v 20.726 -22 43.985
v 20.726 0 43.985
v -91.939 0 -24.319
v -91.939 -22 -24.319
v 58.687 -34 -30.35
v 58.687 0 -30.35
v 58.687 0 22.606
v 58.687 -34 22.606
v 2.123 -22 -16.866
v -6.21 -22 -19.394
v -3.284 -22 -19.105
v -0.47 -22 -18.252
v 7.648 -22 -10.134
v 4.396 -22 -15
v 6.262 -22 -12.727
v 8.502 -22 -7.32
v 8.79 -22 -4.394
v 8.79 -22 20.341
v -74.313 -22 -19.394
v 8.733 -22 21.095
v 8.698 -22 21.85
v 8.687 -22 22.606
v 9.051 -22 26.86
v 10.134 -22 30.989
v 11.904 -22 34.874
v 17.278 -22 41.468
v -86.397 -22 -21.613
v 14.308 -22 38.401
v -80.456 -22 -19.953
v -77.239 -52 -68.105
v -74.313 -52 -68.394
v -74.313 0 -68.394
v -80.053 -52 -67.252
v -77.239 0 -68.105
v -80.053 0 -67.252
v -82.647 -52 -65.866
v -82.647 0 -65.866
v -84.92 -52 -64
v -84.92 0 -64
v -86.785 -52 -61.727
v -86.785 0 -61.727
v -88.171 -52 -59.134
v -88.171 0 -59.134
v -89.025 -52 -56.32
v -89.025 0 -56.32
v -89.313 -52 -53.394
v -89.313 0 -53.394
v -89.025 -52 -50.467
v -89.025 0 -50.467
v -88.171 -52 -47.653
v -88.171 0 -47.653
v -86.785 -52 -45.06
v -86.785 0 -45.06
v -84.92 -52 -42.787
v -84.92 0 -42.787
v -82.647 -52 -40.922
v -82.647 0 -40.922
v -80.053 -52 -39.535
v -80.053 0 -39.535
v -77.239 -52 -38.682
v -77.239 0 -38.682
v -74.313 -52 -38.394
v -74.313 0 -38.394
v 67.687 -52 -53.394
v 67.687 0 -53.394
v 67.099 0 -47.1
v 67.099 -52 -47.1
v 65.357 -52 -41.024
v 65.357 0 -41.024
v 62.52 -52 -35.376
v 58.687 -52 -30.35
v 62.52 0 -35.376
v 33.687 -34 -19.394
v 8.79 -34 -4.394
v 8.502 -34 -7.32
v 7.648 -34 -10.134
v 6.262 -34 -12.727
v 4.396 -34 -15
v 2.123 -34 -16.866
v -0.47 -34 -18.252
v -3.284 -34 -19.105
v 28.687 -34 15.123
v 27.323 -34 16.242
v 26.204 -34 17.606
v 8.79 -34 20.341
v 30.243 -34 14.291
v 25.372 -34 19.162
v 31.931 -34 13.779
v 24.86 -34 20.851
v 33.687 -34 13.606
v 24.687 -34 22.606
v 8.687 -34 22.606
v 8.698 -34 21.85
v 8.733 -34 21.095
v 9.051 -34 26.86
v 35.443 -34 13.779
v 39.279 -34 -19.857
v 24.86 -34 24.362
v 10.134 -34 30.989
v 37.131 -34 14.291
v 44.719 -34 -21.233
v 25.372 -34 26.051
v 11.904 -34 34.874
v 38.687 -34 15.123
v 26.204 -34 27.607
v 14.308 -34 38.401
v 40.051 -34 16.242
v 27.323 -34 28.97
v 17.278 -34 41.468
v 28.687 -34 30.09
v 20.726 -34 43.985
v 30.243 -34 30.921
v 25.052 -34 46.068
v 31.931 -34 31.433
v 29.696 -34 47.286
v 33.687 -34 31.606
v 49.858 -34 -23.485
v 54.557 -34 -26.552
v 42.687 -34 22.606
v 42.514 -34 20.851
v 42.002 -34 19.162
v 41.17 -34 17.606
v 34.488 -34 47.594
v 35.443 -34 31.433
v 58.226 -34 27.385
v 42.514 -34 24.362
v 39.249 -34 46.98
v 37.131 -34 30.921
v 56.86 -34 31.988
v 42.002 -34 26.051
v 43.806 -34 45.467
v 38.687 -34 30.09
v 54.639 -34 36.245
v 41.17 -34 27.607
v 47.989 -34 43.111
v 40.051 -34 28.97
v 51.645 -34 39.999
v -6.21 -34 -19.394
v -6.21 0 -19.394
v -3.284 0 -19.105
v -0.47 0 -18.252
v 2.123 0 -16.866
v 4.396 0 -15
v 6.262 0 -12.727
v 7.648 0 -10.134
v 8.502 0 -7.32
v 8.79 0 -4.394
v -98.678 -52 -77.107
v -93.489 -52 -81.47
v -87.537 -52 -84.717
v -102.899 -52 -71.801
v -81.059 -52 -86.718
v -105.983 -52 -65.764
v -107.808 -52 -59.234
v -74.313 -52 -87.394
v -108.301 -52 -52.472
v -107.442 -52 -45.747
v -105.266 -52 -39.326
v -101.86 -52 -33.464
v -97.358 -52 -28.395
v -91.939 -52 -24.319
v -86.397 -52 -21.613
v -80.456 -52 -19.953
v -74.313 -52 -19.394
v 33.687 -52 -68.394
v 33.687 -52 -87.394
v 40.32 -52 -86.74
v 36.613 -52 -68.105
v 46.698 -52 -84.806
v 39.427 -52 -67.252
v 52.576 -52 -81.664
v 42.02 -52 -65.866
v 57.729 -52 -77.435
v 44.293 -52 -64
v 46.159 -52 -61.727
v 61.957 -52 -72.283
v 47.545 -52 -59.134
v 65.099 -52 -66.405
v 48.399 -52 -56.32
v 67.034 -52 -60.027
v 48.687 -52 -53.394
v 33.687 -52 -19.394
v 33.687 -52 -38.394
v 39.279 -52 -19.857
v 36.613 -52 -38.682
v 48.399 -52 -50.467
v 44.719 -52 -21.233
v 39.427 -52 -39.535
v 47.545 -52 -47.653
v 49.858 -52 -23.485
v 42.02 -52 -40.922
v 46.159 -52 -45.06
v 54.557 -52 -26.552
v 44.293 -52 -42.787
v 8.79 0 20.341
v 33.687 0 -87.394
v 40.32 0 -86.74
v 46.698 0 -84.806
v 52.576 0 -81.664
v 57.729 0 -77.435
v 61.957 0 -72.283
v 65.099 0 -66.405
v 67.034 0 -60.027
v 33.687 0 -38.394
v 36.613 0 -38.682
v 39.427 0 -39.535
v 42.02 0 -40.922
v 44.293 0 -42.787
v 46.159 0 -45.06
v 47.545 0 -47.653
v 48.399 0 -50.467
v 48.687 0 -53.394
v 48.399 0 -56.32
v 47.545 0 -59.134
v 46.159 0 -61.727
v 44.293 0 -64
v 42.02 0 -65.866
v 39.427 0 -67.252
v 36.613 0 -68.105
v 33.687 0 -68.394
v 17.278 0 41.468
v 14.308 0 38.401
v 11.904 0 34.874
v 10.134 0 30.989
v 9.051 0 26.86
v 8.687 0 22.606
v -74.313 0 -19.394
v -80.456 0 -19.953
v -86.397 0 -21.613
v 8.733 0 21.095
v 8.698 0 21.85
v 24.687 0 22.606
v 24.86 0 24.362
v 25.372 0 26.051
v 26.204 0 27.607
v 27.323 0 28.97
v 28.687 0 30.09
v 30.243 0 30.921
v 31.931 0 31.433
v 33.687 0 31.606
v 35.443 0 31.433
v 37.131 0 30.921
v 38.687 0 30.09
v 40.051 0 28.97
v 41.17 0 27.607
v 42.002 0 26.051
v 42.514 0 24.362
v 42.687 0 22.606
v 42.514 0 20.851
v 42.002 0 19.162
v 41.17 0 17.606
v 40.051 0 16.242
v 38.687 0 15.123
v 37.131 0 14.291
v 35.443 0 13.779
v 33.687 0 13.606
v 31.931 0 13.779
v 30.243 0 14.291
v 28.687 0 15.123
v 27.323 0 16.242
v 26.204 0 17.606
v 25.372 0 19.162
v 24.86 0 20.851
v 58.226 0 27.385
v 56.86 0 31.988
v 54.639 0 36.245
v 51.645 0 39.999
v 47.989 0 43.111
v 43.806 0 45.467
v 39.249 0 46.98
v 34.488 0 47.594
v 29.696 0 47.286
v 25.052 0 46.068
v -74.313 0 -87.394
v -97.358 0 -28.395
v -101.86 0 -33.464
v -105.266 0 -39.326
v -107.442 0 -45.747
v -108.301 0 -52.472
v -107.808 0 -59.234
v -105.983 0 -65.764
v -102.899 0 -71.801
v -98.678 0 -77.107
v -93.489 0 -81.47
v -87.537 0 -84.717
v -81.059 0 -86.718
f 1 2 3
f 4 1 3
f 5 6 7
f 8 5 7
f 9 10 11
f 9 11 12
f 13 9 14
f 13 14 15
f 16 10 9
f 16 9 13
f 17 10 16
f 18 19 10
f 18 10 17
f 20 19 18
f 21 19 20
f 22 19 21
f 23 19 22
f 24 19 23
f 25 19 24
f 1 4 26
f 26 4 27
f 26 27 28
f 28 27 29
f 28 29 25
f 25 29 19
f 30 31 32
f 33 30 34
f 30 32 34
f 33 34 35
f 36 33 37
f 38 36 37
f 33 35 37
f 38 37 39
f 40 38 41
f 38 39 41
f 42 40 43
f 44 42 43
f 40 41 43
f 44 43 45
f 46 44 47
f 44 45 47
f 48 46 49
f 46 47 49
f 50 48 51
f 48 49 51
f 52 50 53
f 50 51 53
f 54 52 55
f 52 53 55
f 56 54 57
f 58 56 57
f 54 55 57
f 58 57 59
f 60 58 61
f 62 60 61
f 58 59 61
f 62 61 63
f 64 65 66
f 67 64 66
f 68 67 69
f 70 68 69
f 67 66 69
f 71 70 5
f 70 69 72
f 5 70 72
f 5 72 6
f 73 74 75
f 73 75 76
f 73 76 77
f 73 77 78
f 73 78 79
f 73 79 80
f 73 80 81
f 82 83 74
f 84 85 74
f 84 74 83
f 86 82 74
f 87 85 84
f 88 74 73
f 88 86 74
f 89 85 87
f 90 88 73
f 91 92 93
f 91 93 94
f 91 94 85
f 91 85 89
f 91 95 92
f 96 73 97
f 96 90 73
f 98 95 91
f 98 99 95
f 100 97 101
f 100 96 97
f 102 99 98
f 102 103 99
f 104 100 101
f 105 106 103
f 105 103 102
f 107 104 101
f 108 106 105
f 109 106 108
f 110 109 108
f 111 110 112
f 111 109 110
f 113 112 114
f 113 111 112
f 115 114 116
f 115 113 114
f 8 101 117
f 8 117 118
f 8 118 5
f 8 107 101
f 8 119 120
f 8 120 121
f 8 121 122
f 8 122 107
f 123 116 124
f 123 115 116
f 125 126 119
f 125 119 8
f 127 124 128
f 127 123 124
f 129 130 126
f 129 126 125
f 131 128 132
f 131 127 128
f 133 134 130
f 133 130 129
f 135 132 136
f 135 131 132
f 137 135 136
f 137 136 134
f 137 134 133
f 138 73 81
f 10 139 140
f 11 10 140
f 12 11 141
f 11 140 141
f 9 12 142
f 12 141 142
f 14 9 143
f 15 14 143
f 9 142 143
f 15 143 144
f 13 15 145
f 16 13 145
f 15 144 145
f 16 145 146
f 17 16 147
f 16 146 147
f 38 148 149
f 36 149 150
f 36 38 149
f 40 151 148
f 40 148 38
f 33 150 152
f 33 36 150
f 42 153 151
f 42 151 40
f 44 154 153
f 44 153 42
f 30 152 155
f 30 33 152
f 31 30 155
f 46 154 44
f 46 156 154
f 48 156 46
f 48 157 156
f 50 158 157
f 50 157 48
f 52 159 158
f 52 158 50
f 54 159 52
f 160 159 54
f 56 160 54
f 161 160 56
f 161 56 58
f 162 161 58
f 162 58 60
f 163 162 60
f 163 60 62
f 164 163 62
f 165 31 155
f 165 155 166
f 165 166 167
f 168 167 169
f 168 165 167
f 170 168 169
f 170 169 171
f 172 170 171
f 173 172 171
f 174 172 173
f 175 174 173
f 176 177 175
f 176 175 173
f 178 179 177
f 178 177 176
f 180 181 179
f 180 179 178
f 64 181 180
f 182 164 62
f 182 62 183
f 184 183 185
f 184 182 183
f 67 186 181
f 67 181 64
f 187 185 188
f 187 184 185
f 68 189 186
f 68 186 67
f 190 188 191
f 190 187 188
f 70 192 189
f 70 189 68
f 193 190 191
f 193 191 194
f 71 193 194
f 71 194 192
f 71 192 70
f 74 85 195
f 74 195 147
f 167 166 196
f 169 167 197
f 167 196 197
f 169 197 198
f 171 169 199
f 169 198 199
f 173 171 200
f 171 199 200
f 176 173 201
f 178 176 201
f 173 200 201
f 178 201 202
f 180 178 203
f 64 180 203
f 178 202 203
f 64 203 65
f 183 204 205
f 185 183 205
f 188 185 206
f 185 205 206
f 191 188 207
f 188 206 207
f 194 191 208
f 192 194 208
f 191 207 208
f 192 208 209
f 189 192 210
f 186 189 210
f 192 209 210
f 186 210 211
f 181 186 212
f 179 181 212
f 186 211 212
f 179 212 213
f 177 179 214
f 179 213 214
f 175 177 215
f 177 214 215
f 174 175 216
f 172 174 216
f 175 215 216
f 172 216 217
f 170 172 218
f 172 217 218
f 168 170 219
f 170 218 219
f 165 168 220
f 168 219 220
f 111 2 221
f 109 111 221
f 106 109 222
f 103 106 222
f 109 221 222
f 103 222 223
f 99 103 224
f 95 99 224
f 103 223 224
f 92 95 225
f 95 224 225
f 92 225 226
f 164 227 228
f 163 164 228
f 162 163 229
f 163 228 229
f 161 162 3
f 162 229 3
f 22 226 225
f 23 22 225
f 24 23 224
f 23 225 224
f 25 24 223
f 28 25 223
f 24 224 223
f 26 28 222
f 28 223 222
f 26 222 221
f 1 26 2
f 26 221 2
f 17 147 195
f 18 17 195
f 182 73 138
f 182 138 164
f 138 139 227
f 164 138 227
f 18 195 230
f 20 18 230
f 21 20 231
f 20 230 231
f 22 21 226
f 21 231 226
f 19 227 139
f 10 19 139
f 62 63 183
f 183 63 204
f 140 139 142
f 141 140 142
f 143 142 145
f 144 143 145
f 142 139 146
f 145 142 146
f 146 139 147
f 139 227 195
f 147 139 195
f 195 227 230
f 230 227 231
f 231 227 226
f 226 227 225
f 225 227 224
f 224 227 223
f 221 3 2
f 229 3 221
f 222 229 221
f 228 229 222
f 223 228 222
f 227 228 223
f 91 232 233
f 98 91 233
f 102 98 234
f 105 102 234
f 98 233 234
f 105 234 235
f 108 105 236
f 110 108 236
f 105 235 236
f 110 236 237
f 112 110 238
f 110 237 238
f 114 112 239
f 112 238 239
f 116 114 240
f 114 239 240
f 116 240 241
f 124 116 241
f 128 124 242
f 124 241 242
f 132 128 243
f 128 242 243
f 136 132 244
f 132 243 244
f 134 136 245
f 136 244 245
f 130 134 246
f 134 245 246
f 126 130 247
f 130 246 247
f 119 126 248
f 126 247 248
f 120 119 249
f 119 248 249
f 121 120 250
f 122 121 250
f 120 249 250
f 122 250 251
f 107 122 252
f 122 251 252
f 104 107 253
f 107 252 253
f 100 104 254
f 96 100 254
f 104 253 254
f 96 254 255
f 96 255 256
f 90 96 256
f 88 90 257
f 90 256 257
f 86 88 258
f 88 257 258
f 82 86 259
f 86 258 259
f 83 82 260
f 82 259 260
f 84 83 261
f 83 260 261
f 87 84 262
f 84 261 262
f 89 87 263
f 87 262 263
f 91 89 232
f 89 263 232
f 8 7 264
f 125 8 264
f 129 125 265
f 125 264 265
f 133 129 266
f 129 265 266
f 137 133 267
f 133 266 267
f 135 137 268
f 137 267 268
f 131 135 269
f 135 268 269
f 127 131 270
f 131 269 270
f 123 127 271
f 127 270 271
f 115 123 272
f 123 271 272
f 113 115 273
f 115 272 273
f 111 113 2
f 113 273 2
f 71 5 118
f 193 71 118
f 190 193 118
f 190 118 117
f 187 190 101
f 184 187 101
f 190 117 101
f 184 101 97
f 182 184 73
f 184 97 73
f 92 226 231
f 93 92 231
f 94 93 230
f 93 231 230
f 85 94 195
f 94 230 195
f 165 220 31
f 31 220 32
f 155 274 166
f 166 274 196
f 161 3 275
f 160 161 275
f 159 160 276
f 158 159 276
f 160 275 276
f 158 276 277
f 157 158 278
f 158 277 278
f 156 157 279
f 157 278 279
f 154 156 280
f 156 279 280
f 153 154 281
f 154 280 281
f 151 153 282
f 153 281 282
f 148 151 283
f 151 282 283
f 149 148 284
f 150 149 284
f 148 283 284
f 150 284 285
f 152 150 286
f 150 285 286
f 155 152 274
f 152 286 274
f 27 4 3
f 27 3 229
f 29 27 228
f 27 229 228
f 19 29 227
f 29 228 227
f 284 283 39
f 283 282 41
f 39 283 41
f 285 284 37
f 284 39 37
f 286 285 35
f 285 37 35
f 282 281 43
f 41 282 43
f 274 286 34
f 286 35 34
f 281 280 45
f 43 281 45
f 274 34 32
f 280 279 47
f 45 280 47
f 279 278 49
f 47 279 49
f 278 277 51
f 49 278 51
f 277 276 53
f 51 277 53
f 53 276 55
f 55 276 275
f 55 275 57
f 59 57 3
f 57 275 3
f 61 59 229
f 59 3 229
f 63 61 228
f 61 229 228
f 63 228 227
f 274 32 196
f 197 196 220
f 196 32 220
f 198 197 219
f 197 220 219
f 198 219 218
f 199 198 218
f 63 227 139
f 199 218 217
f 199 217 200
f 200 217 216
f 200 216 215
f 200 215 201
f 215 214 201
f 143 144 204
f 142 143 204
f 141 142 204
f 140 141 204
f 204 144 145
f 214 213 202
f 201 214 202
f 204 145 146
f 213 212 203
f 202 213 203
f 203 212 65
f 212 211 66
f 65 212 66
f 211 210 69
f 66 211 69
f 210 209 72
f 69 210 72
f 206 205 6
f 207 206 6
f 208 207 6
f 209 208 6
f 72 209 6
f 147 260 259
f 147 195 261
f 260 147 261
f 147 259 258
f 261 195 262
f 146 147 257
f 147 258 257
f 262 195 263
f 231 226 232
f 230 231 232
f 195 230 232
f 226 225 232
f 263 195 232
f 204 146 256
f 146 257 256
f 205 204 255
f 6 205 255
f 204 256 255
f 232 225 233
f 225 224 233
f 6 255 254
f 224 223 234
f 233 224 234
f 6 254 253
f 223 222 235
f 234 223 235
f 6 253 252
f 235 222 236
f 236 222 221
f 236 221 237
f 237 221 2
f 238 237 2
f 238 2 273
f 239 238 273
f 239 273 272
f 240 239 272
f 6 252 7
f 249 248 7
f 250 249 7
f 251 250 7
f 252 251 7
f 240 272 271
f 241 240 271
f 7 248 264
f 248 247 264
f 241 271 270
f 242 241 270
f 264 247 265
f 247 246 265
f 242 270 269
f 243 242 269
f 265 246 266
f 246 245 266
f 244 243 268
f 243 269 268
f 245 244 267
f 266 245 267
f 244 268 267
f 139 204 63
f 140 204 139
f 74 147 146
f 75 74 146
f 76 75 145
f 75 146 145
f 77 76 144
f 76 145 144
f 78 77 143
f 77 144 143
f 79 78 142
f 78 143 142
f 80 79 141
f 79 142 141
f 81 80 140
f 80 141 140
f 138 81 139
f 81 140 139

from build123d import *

# Parameters (mm, degrees)
F1_DEPTH = 52
F2_DEPTH = 34
F3_DEPTH = 22


with BuildPart() as f1:
    # F0 (on Front) → F1 (new body)
    with BuildSketch(Plane.XZ):
        with BuildLine():
            ThreePointArc((3.1745948681, -38.3936265707), (15.7146867173, -24.5318871914), (33.6868874729, -19.3936265707))
            Line((33.6868874729, -19.3936265707), (-6.2102505072, -19.3936265707))
            Line((-6.2102505072, -19.3936265707), (-74.3131125271, -19.3936265707))
            ThreePointArc((-74.3131125271, -19.3936265707), (-56.3409117715, -24.5318871914), (-43.8008199223, -38.3936265707))
            Line((-43.8008199223, -38.3936265707), (3.1745948681, -38.3936265707))
        make_face()
        with BuildLine():
            ThreePointArc((-43.8008199223, -38.3936265707), (-56.3409117715, -24.5318871914), (-74.3131125271, -19.3936265707))
            Line((-74.3131125271, -19.3936265707), (-74.3131125271, -38.3936265707))
            Line((-74.3131125271, -38.3936265707), (-43.8008199223, -38.3936265707))
        make_face()
        with BuildLine():
            ThreePointArc((-74.3131125271, -19.3936265707), (-83.4639381348, -20.6482087127), (-91.9394424253, -24.3193682943))
            ThreePointArc((-91.9394424253, -24.3193682943), (-107.0585303852, -62.5444521784), (-74.3131125271, -87.3936265707))
            Line((-74.3131125271, -87.3936265707), (-74.3131125271, -68.3936265707))
            ThreePointArc((-74.3131125271, -68.3936265707), (-89.3131125271, -53.3936265707), (-74.3131125271, -38.3936265707))
            Line((-74.3131125271, -38.3936265707), (-74.3131125271, -19.3936265707))
        make_face()
        with BuildLine():
            Line((-74.3131125271, -68.3936265707), (-74.3131125271, -87.3936265707))
            ThreePointArc((-74.3131125271, -87.3936265707), (-56.3409117715, -82.25536595), (-43.8008199223, -68.3936265707))
            Line((-43.8008199223, -68.3936265707), (-74.3131125271, -68.3936265707))
        make_face()
        with BuildLine():
            Line((-74.3131125271, -87.3936265707), (33.6868874729, -87.3936265707))
            ThreePointArc((33.6868874729, -87.3936265707), (15.7146867173, -82.25536595), (3.1745948681, -68.3936265707))
            Line((3.1745948681, -68.3936265707), (-43.8008199223, -68.3936265707))
            ThreePointArc((-43.8008199223, -68.3936265707), (-56.3409117715, -82.25536595), (-74.3131125271, -87.3936265707))
        make_face()
        with BuildLine():
            ThreePointArc((3.1745948681, -68.3936265707), (15.7146867173, -82.25536595), (33.6868874729, -87.3936265707))
            Line((33.6868874729, -87.3936265707), (33.6868874729, -68.3936265707))
            Line((33.6868874729, -68.3936265707), (3.1745948681, -68.3936265707))
        make_face()
        with BuildLine():
            ThreePointArc((67.6868874729, -53.3936265707), (65.3570627171, -41.0243096938), (58.6868874729, -30.3501893271))
            ThreePointArc((58.6868874729, -30.3501893271), (47.3346553072, -22.2530030519), (33.6868874729, -19.3936265707))
            Line((33.6868874729, -19.3936265707), (33.6868874729, -38.3936265707))
            ThreePointArc((33.6868874729, -38.3936265707), (48.6868874729, -53.3936265707), (33.6868874729, -68.3936265707))
            Line((33.6868874729, -68.3936265707), (33.6868874729, -87.3936265707))
            ThreePointArc((33.6868874729, -87.3936265707), (57.7285180332, -77.435257131), (67.6868874729, -53.3936265707))
        make_face()
        with BuildLine():
            Line((33.6868874729, -38.3936265707), (33.6868874729, -19.3936265707))
            ThreePointArc((33.6868874729, -19.3936265707), (15.7146867173, -24.5318871914), (3.1745948681, -38.3936265707))
            Line((3.1745948681, -38.3936265707), (33.6868874729, -38.3936265707))
        make_face()
    extrude(amount=F1_DEPTH)

    # F0 (on Front) → F2 (join)
    with BuildSketch(Plane.XZ):
        with BuildLine():
            Line((58.6868874729, 22.6063734293), (42.6868874729, 22.6063734293))
            ThreePointArc((42.6868874729, 22.6063734293), (33.6868874729, 13.6063734293), (24.6868874729, 22.6063734293))
            Line((24.6868874729, 22.6063734293), (8.6868874729, 22.6063734293))
            ThreePointArc((8.6868874729, 22.6063734293), (8.7126162172, 21.4724531281), (8.7897494928, 20.3408667745))
            ThreePointArc((8.7897494928, 20.3408667745), (34.8208077741, -2.3678978263), (58.6868874729, 22.6063734293))
        make_face()
        with BuildLine():
            ThreePointArc((24.6868874729, 22.6063734293), (33.6868874729, 31.6063734293), (42.6868874729, 22.6063734293))
            Line((42.6868874729, 22.6063734293), (58.6868874729, 22.6063734293))
            ThreePointArc((58.6868874729, 22.6063734293), (45.9544581931, 44.389548327), (20.726350783, 43.9845045149))
            ThreePointArc((20.726350783, 43.9845045149), (11.9037125752, 34.8739441496), (8.6868874729, 22.6063734293))
            Line((8.6868874729, 22.6063734293), (24.6868874729, 22.6063734293))
        make_face()
        with BuildLine():
            Line((58.6868874729, -30.3501893271), (58.6868874729, 22.6063734293))
            ThreePointArc((58.6868874729, 22.6063734293), (34.8208077741, -2.3678978263), (8.7897494928, 20.3408667745))
            Line((8.7897494928, 20.3408667745), (8.7897494928, -4.3936265707))
            ThreePointArc((8.7897494928, -4.3936265707), (4.3963512106, -15.0002282885), (-6.2102505072, -19.3936265707))
            Line((-6.2102505072, -19.3936265707), (33.6868874729, -19.3936265707))
            ThreePointArc((33.6868874729, -19.3936265707), (47.3346553072, -22.2530030519), (58.6868874729, -30.3501893271))
        make_face()
    extrude(amount=F2_DEPTH)


with BuildPart() as f3:
    # F0 (on Front) → F3 (new body)
    with BuildSketch(Plane.XZ):
        with BuildLine():
            ThreePointArc((8.7897494928, 20.3408667745), (8.7126162172, 21.4724531281), (8.6868874729, 22.6063734293))
            Line((8.6868874729, 22.6063734293), (-14.5364241814, 22.6063734293))
            Line((-14.5364241814, 22.6063734293), (-91.9394424253, -24.3193682943))
            ThreePointArc((-91.9394424253, -24.3193682943), (-83.4639381348, -20.6482087127), (-74.3131125271, -19.3936265707))
            Line((-74.3131125271, -19.3936265707), (-6.2102505072, -19.3936265707))
            ThreePointArc((-6.2102505072, -19.3936265707), (4.3963512106, -15.0002282885), (8.7897494928, -4.3936265707))
            Line((8.7897494928, -4.3936265707), (8.7897494928, 20.3408667745))
        make_face()
        with BuildLine():
            Line((-14.5364241814, 22.6063734293), (8.6868874729, 22.6063734293))
            ThreePointArc((8.6868874729, 22.6063734293), (11.9037125752, 34.8739441496), (20.726350783, 43.9845045149))
            Line((20.726350783, 43.9845045149), (-14.5364241814, 22.6063734293))
        make_face()
    extrude(amount=F3_DEPTH)


solid = Compound([f1.part, f3.part])
